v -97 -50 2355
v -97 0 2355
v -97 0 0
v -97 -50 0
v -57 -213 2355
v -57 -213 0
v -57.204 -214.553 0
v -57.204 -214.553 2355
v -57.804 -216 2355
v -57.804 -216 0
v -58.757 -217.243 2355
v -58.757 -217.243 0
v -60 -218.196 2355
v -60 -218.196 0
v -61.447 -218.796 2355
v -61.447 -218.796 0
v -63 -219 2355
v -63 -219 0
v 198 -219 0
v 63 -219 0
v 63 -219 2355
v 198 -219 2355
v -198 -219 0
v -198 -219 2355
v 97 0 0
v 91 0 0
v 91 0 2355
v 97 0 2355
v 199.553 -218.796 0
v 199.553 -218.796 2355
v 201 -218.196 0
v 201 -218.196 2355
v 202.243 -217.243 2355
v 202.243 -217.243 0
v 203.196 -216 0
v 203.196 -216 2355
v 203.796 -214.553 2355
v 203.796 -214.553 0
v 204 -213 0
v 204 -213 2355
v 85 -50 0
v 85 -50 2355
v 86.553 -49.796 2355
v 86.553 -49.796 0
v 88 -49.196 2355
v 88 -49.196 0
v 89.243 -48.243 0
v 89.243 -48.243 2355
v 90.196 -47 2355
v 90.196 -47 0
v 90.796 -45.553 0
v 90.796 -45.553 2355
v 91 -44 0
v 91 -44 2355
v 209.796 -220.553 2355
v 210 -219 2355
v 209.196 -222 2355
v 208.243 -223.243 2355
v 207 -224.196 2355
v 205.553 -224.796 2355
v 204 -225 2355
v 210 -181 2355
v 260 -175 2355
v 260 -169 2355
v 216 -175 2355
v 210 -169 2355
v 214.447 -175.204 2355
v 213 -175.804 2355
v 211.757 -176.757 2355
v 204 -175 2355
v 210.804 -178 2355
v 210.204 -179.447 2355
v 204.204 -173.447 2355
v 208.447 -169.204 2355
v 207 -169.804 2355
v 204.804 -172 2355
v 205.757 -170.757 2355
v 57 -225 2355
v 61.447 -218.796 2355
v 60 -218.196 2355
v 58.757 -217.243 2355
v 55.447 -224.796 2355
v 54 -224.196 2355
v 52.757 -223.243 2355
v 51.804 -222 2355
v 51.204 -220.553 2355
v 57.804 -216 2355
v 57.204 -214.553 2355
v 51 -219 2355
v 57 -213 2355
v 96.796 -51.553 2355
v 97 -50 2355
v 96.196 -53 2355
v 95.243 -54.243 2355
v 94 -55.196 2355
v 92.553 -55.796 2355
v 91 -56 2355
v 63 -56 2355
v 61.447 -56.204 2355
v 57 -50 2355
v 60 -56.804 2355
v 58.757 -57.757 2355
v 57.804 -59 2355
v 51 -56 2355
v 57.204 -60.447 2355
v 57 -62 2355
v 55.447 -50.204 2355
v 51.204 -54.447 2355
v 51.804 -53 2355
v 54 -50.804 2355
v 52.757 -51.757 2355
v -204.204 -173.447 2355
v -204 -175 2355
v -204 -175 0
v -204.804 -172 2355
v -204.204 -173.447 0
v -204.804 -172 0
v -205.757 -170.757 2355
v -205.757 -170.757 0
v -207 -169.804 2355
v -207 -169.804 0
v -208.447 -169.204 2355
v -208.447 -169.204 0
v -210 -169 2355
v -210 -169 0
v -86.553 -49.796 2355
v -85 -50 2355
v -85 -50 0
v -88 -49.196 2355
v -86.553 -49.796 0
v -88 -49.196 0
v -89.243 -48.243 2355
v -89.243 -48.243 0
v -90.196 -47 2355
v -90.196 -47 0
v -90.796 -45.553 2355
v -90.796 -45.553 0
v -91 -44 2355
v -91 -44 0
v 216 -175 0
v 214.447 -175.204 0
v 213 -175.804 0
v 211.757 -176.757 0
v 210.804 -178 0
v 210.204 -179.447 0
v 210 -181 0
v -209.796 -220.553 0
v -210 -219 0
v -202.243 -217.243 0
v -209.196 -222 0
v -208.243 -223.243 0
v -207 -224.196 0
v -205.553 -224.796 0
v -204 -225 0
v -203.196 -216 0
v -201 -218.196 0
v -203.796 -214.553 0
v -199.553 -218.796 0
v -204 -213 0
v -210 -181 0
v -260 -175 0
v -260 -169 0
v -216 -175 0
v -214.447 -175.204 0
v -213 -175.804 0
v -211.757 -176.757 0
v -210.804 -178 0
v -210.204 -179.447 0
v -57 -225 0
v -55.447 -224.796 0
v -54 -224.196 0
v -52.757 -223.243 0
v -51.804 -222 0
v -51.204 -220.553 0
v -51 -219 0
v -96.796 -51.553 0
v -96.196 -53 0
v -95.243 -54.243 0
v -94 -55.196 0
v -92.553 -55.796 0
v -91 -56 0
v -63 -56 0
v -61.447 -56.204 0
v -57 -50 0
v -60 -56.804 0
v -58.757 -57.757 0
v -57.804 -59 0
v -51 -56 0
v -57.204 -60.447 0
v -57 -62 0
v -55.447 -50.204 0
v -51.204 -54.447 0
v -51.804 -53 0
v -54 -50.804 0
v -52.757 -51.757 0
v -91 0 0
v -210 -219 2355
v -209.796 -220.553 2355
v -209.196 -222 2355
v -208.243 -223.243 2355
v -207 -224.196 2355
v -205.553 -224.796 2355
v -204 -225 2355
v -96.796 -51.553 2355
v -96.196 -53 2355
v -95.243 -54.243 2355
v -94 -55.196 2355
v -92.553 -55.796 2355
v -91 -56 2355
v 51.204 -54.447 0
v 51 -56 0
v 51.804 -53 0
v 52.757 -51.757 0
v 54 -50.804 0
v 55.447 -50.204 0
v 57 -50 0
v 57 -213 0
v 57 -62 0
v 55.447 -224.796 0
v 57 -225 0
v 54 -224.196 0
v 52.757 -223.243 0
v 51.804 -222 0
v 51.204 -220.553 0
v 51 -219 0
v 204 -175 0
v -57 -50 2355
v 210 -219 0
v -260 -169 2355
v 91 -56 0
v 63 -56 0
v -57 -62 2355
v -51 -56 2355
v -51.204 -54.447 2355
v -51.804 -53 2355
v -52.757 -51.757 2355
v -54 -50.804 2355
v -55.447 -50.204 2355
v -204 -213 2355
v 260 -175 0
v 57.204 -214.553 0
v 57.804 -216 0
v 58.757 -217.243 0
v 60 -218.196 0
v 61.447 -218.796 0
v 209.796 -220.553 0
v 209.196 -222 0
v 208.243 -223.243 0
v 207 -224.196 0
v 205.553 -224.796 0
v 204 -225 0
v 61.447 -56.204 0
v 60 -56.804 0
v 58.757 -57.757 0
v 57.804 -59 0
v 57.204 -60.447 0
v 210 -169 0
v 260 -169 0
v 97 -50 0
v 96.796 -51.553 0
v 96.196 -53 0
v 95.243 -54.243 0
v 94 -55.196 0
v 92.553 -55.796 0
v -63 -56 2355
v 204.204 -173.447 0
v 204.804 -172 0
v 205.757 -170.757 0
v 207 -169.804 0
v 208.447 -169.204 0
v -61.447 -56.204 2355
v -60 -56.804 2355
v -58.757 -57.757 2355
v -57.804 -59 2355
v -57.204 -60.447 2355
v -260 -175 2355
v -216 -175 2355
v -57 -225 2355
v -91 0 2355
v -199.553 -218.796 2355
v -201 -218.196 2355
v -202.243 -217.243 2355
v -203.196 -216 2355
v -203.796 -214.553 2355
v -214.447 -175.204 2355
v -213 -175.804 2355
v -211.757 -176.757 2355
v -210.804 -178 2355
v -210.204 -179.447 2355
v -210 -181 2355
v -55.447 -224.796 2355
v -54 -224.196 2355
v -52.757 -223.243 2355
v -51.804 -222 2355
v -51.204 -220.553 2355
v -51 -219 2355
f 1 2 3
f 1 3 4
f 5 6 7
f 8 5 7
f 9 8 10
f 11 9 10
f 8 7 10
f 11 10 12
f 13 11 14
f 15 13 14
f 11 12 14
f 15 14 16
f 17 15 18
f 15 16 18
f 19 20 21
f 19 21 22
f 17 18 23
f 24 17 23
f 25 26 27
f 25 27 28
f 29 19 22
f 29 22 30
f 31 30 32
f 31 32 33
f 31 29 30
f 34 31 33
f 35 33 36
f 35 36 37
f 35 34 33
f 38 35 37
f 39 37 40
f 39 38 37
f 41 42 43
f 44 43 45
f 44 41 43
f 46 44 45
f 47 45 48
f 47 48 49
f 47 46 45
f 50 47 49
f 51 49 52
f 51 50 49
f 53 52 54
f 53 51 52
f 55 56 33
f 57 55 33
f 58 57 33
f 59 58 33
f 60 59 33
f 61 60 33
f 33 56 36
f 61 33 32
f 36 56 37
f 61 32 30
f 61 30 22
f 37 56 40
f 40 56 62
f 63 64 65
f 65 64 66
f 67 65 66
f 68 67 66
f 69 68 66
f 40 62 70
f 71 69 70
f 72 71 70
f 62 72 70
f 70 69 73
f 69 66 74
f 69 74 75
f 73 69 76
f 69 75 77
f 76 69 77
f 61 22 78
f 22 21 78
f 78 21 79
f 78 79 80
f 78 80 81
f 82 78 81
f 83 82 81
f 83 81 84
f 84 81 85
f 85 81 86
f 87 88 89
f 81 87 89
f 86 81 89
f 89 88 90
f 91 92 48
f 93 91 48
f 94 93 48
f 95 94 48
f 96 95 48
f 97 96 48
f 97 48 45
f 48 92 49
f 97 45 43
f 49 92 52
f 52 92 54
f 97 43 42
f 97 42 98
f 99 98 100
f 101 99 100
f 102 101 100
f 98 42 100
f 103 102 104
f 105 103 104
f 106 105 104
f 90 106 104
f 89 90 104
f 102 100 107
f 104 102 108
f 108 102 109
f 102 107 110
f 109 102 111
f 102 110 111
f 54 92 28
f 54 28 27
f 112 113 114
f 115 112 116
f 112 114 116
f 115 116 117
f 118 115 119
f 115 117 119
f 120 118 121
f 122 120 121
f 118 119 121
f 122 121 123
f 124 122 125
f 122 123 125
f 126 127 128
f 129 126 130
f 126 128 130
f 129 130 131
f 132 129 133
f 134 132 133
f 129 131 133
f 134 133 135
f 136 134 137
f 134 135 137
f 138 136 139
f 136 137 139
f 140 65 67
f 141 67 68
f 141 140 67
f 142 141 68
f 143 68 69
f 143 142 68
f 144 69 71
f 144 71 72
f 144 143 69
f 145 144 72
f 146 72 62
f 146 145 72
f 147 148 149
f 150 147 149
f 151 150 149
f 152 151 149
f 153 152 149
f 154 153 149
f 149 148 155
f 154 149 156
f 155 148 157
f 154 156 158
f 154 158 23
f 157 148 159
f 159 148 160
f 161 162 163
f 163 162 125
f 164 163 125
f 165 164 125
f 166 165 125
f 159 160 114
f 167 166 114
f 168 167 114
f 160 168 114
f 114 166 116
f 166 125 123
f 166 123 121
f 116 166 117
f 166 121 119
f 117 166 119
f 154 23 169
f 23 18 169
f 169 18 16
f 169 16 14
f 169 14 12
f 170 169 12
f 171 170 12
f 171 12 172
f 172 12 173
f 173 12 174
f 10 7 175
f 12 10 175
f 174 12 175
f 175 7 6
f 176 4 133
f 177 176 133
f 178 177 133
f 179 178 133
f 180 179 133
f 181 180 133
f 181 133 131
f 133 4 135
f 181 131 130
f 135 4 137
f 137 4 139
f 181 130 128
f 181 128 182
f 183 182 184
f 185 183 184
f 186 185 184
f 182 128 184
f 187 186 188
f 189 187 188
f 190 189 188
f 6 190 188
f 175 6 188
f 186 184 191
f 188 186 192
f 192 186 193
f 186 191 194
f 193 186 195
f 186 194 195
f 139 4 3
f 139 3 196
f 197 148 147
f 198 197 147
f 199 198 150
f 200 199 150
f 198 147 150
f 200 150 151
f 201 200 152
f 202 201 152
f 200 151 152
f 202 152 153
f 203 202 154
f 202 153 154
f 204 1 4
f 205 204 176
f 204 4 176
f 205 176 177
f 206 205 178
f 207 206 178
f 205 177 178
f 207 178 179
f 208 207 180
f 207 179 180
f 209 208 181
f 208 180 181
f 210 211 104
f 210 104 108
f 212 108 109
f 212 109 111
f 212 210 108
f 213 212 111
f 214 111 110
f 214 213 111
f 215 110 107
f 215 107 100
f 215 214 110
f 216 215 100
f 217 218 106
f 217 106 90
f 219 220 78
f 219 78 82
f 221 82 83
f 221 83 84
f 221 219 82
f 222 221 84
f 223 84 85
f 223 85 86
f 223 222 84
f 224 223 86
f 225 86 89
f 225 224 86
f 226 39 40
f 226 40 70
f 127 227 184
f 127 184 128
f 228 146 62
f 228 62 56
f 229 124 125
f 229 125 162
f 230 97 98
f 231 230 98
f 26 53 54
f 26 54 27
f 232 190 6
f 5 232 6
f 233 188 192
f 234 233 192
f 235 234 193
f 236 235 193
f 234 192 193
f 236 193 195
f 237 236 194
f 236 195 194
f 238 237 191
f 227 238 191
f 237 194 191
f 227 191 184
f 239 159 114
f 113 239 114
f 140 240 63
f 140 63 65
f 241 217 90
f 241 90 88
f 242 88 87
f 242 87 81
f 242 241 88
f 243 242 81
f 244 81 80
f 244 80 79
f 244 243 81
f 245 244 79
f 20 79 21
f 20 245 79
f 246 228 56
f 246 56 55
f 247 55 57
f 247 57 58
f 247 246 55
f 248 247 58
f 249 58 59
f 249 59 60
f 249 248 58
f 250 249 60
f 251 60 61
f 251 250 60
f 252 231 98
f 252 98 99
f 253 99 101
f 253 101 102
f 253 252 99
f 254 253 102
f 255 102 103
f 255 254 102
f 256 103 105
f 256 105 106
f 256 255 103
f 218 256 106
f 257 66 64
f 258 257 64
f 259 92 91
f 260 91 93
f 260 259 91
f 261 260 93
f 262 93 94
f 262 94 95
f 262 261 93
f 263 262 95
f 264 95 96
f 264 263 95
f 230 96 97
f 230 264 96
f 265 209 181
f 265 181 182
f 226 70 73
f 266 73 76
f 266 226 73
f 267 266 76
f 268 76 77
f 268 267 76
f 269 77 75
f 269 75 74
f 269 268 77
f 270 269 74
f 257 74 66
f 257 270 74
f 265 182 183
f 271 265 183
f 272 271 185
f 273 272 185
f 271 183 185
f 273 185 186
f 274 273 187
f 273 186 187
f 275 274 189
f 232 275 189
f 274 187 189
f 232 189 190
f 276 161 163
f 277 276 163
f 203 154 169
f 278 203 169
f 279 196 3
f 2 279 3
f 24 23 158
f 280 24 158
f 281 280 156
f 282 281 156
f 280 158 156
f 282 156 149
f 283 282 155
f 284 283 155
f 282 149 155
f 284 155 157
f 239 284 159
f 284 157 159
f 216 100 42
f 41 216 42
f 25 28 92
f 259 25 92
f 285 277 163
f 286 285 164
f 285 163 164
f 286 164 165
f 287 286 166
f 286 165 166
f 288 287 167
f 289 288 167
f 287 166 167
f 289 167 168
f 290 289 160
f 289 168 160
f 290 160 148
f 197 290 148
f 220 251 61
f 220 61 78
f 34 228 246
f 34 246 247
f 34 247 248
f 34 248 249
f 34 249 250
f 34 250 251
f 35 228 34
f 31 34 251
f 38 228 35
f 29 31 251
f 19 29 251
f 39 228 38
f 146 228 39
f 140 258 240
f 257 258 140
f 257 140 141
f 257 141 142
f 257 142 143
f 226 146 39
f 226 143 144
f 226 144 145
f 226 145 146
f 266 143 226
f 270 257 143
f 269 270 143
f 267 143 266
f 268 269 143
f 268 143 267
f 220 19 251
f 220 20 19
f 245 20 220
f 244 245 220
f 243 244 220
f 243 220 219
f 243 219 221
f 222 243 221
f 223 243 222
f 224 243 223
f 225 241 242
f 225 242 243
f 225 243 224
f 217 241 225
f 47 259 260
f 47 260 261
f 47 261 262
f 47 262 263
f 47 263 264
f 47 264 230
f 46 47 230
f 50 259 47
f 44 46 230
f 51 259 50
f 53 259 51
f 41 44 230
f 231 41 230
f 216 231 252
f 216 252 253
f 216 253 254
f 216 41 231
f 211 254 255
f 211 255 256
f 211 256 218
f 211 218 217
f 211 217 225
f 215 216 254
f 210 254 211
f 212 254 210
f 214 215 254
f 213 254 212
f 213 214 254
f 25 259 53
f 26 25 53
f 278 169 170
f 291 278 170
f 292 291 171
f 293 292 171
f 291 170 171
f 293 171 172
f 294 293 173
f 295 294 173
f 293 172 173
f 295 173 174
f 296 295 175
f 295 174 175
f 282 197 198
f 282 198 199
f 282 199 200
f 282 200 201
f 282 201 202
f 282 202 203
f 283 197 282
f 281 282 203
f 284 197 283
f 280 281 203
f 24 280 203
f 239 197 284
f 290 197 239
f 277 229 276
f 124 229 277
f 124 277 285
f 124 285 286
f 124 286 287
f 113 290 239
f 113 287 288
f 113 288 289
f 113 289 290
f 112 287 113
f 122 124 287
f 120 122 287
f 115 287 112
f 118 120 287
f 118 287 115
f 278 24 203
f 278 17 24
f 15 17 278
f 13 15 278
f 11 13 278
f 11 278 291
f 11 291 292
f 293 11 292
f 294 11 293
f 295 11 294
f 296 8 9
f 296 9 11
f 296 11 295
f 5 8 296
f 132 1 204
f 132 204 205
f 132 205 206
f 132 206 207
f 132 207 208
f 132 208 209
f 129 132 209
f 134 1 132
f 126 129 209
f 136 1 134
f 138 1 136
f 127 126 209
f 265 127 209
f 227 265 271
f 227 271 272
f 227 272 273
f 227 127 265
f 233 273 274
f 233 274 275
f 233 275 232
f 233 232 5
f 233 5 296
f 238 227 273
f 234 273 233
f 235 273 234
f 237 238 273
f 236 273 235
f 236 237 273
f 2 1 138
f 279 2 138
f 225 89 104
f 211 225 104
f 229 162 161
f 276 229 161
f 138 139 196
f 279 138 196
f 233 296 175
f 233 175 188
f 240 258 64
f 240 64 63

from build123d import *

# Parameters (mm, degrees)
F1_DEPTH = 2355


with BuildPart() as f1:
    # F0 (on Top) → F1 (new body)
    with BuildSketch(Plane.XY):
        with BuildLine():
            Line((-90.999993, -43.999994), (-90.999993, 6e-06))
            Line((-90.999993, 6e-06), (-96.999993, 6e-06))
            Line((-96.999993, 6e-06), (-96.999993, -49.999994))
            ThreePointArc((-96.999993, -49.999994), (-95.242634, -54.242635), (-90.999993, -55.999994))
            Line((-90.999993, -55.999994), (-62.999993, -55.999994))
            ThreePointArc((-62.999993, -55.999994), (-58.757353, -57.757353), (-56.999993, -61.999994))
            Line((-56.999993, -61.999994), (-56.999993, -212.999994))
            ThreePointArc((-56.999993, -212.999994), (-58.757353, -217.242635), (-62.999993, -218.999994))
            Line((-62.999993, -218.999994), (-197.999993, -218.999994))
            ThreePointArc((-197.999993, -218.999994), (-202.242634, -217.242635), (-203.999993, -212.999994))
            Line((-203.999993, -212.999994), (-203.999993, -174.999994))
            ThreePointArc((-203.999993, -174.999994), (-205.757353, -170.757353), (-209.999993, -168.999994))
            Line((-209.999993, -168.999994), (-259.999993, -168.999994))
            Line((-259.999993, -168.999994), (-259.999993, -174.999994))
            Line((-259.999993, -174.999994), (-215.999993, -174.999994))
            ThreePointArc((-215.999993, -174.999994), (-211.757353, -176.757353), (-209.999993, -180.999994))
            Line((-209.999993, -180.999994), (-209.999993, -218.999994))
            ThreePointArc((-209.999993, -218.999994), (-208.242634, -223.242635), (-203.999993, -224.999994))
            Line((-203.999993, -224.999994), (-56.999993, -224.999994))
            ThreePointArc((-56.999993, -224.999994), (-52.757353, -223.242635), (-50.999993, -218.999994))
            Line((-50.999993, -218.999994), (-50.999993, -55.999994))
            ThreePointArc((-50.999993, -55.999994), (-52.757353, -51.757353), (-56.999993, -49.999994))
            Line((-56.999993, -49.999994), (-84.999993, -49.999994))
            ThreePointArc((-84.999993, -49.999994), (-89.242634, -48.242635), (-90.999993, -43.999994))
        make_face()
    extrude(amount=F1_DEPTH)


with BuildPart() as f2_1:
    # F2: instance of F1
    add(f1.part.mirror(Plane.YZ))


solid = Compound([f1.part, f2_1.part])
